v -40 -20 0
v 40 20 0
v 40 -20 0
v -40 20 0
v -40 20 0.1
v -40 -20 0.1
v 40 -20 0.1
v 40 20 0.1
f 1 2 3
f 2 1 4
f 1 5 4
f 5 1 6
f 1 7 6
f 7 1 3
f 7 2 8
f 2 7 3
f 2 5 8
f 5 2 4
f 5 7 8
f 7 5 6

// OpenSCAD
// file: ../p/box5-12.scad
use <../lib.scad>
function ldraw_lib__box5_12() = [
// 0 Box with 5 Faces without Any Edges
// 0 Name: box5-12.dat
// 0 Author: Chris Dee [cwdee]
// 0 !LDRAW_ORG Primitive UPDATE 2009-02
// 0 !LICENSE Licensed under CC BY 2.0 and CC BY 4.0 : see CAreadme.txt
// 
// 0 BFC CERTIFY CCW
  [0,"BFC","CERTIFY"],
  [0,"BFC","CCW"],
// 
// 0 !HISTORY 2009-09-03 [PTadmin] Official Update 2009-02
// 
// 
// 4 16 1 1 1 1 1 -1 -1 1 -1 -1 1 1
  [4,16,1,1,1,1,1,-1,-1,1,-1,-1,1,1],
// 4 16 -1 0 1 1 0 1 1 1 1 -1 1 1
  [4,16,-1,0,1,1,0,1,1,1,1,-1,1,1],
// 4 16 -1 0 -1 -1 0 1 -1 1 1 -1 1 -1
  [4,16,-1,0,-1,-1,0,1,-1,1,1,-1,1,-1],
// 4 16 1 0 -1 -1 0 -1 -1 1 -1 1 1 -1
  [4,16,1,0,-1,-1,0,-1,-1,1,-1,1,1,-1],
// 4 16 1 0 1 1 0 -1 1 1 -1 1 1 1
  [4,16,1,0,1,1,0,-1,1,1,-1,1,1,1],
// 0
];
makepoly(ldraw_lib__box5_12(), line=0.2);
// main file
use <../lib.scad>
use <../p/box5-12.scad>
function ldraw_lib__6204380a() = [
// 0 Sticker  5 x 10 with UCS BB-8
// 0 Name: 6204380a.dat
// 0 Author: Vincent Messenet [Cheenzo]
// 0 !LDRAW_ORG Part UPDATE 2022-02
// 0 !LICENSE Licensed under CC BY 2.0 and CC BY 4.0 : see CAreadme.txt
// 
// 0 BFC CERTIFY CCW
  [0,"BFC","CERTIFY"],
  [0,"BFC","CCW"],
// 
// 0 !HISTORY 2022-03-06 [PTadmin] Official Update 2022-02
// 
// 
// 1 16 0 -0.25 0 0 0 -100 0 0.25 0 50 0 0 box5-12.dat
  [1,16,0,-0.25,0,0,0,-100,0,0.25,0,50,0,0, ldraw_lib__box5_12()],
// 0 !TEXMAP START PLANAR -100 -0.25 50 100 -0.25 50 -100 -0.25 -50 6204380a.png
// 0 !: 4 0 -100 -0.25 50 -100 -0.25 -50 100 -0.25 -50 100 -0.25 50
// 0 !TEXMAP FALLBACK
// 0 // Needs Work: fallback pattern
// 4 0 -100 -0.25 50 -100 -0.25 -50 100 -0.25 -50 100 -0.25 50
  [4,0,-100,-0.25,50,-100,-0.25,-50,100,-0.25,-50,100,-0.25,50],
// 0 !TEXMAP END
];
makepoly(ldraw_lib__6204380a(), line=0.2);
